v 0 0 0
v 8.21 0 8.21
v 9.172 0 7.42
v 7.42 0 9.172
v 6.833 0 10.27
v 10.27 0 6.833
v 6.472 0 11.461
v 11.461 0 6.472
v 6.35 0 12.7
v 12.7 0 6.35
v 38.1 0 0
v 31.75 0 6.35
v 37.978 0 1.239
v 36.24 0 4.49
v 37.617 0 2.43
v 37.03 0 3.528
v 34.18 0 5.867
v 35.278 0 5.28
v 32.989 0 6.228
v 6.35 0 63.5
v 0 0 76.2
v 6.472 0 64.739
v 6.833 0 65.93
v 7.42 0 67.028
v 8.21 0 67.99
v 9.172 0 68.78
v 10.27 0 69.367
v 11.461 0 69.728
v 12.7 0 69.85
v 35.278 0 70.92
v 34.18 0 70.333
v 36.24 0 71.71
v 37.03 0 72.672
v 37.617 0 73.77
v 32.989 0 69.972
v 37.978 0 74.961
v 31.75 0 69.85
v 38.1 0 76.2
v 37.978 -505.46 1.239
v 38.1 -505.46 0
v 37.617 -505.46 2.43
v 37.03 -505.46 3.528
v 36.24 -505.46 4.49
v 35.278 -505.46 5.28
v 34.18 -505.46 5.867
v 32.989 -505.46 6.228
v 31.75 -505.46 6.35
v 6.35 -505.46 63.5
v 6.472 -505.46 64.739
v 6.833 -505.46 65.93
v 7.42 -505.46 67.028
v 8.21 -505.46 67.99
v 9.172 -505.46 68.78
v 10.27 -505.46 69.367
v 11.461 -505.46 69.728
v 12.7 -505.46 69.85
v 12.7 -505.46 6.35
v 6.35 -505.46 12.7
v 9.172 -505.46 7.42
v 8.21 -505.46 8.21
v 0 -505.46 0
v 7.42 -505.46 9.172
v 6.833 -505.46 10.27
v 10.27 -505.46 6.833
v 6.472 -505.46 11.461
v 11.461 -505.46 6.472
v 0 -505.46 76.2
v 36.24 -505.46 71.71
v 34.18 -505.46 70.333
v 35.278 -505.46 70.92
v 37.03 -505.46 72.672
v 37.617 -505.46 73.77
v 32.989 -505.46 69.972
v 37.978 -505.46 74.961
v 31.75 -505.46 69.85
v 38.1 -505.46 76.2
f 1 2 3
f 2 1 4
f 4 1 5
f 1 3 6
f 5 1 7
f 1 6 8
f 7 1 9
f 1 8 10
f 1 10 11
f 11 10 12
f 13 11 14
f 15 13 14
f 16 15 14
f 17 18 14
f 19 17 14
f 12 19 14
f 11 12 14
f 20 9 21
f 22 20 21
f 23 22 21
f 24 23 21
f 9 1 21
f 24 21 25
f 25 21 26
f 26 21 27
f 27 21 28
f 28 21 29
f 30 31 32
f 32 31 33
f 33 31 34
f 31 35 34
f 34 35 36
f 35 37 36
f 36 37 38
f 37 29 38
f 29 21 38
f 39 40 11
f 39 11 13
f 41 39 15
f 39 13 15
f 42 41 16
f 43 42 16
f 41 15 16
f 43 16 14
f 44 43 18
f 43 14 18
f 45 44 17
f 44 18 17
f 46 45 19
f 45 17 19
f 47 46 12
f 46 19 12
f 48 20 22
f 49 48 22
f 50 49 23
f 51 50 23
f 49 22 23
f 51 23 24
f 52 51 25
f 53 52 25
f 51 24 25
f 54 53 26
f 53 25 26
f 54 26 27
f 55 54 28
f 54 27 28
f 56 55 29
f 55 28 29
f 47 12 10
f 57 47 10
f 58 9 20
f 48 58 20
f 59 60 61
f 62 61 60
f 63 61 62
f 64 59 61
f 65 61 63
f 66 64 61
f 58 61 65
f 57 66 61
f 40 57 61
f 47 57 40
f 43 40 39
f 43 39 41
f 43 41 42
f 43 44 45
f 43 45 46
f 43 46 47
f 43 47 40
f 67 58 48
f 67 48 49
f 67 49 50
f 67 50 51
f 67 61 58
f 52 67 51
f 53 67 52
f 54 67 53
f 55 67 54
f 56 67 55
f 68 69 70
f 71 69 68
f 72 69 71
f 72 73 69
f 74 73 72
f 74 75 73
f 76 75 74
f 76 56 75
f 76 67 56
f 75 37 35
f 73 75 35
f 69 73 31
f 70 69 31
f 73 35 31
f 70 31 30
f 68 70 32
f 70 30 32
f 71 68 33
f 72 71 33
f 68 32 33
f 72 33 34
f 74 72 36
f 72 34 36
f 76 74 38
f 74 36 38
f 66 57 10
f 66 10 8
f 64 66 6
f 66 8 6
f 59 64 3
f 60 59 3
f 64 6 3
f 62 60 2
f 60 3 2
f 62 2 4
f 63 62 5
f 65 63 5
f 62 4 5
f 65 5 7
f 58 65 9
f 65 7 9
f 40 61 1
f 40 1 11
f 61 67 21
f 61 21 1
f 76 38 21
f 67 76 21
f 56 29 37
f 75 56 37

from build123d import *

# Parameters (mm, degrees)
F1_DEPTH = 505.46


# Not quite as in the source:
# - ends of sketch curves that miss each other by under 0.0002 mm in the source are joined


with BuildPart() as f1:
    # F0 (on Front) → F1 (new body)
    with BuildSketch(Plane.XZ):
        with BuildLine():
            Line((0, 76.2), (0, 0))
            Line((0, 0), (38.1, 0))
            ThreePointArc((38.1, 0), (36.2401280605, 4.4901312434), (31.75, 6.3500031829))
            Line((31.75, 6.3500031829), (12.7000031829, 6.3500031829))
            ThreePointArc((12.7000031829, 6.3500031829), (8.2098751224, 8.2098751224), (6.3500031829, 12.7000031829))
            Line((6.3500031829, 12.7000031829), (6.3500031829, 63.4999968171))
            ThreePointArc((6.3500031829, 63.4999968171), (8.2098751224, 67.9901248776), (12.7000031829, 69.8499968171))
            Line((12.7000031829, 69.8499968171), (31.75, 69.8499968171))
            ThreePointArc((31.75, 69.8499968171), (36.2401280605, 71.7098687566), (38.1, 76.1999968171))
            Line((38.1, 76.1999968171), (0, 76.2))
        make_face()
    extrude(amount=F1_DEPTH)


solid = f1.part
